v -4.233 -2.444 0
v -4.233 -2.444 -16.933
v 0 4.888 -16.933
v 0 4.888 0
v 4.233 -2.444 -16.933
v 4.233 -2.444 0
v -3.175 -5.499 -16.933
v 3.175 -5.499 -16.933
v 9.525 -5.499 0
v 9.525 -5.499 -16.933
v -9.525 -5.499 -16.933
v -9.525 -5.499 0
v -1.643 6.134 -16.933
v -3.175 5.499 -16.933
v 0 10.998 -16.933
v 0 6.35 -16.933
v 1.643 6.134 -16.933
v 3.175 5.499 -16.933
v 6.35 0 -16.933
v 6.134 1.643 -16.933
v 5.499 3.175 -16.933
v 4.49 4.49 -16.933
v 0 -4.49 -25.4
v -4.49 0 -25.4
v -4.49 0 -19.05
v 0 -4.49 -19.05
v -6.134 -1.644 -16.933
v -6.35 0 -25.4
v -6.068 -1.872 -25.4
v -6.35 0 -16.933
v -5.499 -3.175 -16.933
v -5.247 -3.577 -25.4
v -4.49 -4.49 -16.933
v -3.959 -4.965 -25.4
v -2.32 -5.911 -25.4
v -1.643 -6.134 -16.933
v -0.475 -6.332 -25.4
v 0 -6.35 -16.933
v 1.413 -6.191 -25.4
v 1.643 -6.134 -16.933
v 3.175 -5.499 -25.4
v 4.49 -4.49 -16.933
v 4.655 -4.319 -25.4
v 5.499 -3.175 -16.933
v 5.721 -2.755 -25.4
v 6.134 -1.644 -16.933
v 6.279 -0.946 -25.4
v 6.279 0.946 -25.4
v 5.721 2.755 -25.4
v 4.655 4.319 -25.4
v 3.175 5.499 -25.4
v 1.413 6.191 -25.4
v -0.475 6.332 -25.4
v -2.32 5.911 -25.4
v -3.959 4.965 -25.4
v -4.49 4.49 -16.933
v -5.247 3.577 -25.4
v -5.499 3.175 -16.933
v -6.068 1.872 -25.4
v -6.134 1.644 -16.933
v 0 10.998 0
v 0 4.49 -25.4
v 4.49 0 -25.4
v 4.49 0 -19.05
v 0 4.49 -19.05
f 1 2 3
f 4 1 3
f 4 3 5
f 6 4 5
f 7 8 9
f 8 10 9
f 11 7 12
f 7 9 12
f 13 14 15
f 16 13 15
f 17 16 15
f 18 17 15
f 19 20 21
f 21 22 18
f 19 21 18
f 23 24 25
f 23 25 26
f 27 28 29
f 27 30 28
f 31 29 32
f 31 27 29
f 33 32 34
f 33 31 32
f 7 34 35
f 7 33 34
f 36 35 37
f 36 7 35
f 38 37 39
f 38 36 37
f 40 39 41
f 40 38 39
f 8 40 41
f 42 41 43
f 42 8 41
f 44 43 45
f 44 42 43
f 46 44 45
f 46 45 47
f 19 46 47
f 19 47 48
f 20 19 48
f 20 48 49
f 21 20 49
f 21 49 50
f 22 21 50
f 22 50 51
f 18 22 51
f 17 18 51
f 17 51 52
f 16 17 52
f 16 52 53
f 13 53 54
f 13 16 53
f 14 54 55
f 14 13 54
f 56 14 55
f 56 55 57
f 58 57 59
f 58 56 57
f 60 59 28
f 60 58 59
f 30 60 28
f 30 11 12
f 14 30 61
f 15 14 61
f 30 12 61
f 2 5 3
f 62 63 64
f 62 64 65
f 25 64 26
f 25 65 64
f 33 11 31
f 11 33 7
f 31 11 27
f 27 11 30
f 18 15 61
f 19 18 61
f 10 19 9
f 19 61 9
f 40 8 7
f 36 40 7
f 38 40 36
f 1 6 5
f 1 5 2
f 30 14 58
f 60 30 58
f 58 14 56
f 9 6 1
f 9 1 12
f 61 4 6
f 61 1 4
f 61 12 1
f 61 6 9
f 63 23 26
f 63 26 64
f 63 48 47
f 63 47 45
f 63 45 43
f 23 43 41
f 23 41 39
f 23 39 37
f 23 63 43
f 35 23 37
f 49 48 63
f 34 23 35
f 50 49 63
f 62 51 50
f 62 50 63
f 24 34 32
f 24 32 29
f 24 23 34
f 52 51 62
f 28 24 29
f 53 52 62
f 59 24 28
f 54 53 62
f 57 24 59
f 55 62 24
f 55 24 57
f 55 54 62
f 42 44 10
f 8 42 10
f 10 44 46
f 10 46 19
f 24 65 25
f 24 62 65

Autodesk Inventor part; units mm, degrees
ref_plane "YZ Plane" through (0, 0, 0) normal (1, 0, 0) x (0, 1, 0)
ref_plane "XZ Plane" through (0, 0, 0) normal (0, 1, 0) x (-1, 0, 0)
ref_plane "XY Plane" through (0, 0, 0) normal (0, 0, 1) x (1, 0, 0)
sketch "Sketch1" plane through (0, 0, 0) normal (0, 0, 1) x (1, 0, 0)
  line L0 (0, 10.9985) -> (9.525, -5.4993)
  line L1 (9.525, -5.4993) -> (-9.525, -5.4993)
  line L2 (-9.525, -5.4993) -> (0, 10.9985)
  line L3 (0, 4.8882) -> (4.2333, -2.4441)
  line L4 (4.2333, -2.4441) -> (-4.2333, -2.4441)
  line L5 (-4.2333, -2.4441) -> (0, 4.8882)
  point P0 (0, 0)
  point P1 (0, 0)
  point P2 (0, 0)
  dimension "d0" = 19.05
  dimension "d1" = 8.4667
extrude "Extrusion1" add sketch "Sketch1" against normal blind 16.9333
sketch "Sketch2" plane through (0, 0, -16.9333) normal (0, 0, -1) x (-1, 0, 0)
  circle A0 centre (0, 0) radius 6.35
  dimension "d4" = 12.7
extrude "Extrusion2" add sketch "Sketch2" along normal blind 8.4667
sketch "Sketch3" plane through (0, 0, -25.4) normal (0, 0, -1) x (-1, 0, 0)
  line L0 (4.4901, 0) -> (0, -4.4901)
  line L1 (0, -4.4901) -> (-4.4901, 0)
  line L2 (-4.4901, 0) -> (0, 4.4901)
  line L3 (0, 4.4901) -> (4.4901, 0)
  line L4 (4.4901, 0) -> (-4.4901, 0) construction
  line L5 (0, -4.4901) -> (0, 4.4901) construction
  point P0 (0, 0)
  dimension "d7" = 6.35
  dimension "d8" = 6.35
extrude "Extrusion3" cut sketch "Sketch3" against normal blind 6.35
properties part number "Driver Shaft Power" material "ABS Plastic"
